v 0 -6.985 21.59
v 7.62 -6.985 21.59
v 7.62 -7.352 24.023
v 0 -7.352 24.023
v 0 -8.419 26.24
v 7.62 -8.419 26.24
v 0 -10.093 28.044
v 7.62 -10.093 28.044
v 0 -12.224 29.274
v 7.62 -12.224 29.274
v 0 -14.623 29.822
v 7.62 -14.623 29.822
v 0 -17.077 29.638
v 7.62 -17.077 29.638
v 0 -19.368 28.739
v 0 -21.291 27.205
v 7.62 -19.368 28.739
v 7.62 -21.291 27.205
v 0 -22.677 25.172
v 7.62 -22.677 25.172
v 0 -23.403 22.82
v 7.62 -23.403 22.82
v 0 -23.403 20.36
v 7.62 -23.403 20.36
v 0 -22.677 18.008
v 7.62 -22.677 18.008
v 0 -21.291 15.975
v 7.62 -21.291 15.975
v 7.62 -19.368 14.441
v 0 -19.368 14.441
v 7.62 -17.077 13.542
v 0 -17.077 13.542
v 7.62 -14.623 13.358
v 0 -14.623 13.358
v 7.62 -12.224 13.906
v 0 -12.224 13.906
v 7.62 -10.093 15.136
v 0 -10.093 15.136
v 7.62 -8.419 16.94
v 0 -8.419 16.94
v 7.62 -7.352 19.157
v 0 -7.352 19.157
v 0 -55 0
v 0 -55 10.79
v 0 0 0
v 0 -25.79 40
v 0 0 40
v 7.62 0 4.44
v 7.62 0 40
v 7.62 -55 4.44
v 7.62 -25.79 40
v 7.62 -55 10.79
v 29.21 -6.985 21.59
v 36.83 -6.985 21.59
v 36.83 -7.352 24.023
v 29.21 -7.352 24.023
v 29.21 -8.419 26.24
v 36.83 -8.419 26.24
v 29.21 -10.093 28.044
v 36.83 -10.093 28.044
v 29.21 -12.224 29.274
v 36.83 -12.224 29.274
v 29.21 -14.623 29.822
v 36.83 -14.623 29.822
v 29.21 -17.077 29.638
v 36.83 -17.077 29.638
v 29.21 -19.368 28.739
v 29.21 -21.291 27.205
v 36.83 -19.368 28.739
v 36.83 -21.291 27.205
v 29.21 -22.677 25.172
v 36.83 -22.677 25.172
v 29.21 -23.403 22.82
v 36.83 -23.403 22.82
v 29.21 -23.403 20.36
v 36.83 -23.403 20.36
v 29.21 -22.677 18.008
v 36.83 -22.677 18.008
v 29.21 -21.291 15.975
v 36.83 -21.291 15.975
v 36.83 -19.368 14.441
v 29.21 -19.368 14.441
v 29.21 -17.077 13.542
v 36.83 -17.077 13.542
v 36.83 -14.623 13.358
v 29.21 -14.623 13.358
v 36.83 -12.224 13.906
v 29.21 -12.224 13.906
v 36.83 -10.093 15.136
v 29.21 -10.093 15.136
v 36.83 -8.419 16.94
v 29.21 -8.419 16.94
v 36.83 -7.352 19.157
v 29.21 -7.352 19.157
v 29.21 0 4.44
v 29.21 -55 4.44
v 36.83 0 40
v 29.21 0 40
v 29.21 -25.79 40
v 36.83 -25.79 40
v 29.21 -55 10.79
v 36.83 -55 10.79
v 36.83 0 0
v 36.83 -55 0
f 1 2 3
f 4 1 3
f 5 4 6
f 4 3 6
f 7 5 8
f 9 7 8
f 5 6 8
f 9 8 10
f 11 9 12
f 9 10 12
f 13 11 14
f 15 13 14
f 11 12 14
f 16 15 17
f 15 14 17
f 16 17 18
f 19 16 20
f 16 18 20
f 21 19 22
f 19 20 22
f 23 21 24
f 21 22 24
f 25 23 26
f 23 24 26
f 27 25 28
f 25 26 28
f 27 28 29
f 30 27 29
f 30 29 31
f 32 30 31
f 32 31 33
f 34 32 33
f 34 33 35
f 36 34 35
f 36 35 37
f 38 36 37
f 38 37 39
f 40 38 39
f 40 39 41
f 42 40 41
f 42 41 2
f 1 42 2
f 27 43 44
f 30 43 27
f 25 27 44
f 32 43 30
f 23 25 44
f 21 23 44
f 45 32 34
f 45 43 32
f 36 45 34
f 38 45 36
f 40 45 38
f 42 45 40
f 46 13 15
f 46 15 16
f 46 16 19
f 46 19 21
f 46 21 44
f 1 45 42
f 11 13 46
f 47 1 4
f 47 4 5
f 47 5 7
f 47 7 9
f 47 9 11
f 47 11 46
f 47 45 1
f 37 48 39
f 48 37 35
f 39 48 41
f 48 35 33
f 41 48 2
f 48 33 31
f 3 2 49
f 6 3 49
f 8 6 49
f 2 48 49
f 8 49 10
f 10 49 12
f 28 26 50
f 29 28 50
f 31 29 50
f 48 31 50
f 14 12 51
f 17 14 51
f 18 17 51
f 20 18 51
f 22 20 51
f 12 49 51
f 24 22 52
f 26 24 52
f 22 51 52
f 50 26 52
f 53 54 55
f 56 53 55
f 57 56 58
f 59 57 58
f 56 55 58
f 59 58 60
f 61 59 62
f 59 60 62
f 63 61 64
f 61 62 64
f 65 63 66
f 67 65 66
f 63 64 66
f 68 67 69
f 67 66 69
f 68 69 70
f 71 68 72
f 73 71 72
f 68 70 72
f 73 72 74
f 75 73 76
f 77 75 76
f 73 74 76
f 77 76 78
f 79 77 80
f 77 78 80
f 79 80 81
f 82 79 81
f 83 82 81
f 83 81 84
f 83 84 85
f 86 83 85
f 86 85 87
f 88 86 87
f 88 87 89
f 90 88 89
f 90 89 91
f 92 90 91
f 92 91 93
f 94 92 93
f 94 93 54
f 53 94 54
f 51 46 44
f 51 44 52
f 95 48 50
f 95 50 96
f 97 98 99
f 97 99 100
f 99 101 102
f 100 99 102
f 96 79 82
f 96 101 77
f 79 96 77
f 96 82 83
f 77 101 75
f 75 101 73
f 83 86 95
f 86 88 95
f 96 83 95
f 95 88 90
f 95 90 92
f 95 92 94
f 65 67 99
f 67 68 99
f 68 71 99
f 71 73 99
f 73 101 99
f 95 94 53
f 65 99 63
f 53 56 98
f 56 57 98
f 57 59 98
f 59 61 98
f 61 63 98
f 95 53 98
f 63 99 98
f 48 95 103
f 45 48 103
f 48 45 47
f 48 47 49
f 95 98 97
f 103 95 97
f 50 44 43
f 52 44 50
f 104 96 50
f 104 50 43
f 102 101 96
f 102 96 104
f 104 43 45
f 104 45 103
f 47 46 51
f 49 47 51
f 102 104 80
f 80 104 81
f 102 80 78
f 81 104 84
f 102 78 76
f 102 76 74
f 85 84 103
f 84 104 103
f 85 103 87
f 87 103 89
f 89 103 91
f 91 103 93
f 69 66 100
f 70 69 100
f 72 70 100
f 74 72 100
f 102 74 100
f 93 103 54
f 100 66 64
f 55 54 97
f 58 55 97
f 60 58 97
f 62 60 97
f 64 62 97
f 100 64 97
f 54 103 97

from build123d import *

# Parameters (mm, degrees)
F0_W     = 36.83
F0_H     = 40
F1_DEPTH = 55
F2_SIZE  = 29.21
F4_DEPTH = 35.56
F5_R     = 8.255
F6_DEPTH = 50.8


with BuildPart() as f1:
    # F0 (on Front) → F1 (new body)
    with BuildSketch(Plane.XZ):
        with Locations((18.415, 20)):
            Rectangle(F0_W, F0_H)
    extrude(amount=F1_DEPTH)

    # F2
    f2_edges = [f1.edges().sort_by_distance(p)[0] for p in [
        (18.415, -55, 40),
    ]]
    chamfer(f2_edges, length=F2_SIZE)

    # F3 (on face) → F4 (cut)
    with BuildSketch(Plane.XY.offset(40)):
        Polygon((29.21, 0), (7.62, 0), (7.62, -55.67665), (29.21, -55.354353), align=None)
    extrude(amount=-F4_DEPTH, mode=Mode.SUBTRACT)

    # F5 (on face) → F6 (cut)
    with BuildSketch(Plane.YZ.offset(36.83)):
        with Locations((-15.24, 21.59)):
            Circle(F5_R)
    extrude(amount=-F6_DEPTH, mode=Mode.SUBTRACT)


solid = f1.part
